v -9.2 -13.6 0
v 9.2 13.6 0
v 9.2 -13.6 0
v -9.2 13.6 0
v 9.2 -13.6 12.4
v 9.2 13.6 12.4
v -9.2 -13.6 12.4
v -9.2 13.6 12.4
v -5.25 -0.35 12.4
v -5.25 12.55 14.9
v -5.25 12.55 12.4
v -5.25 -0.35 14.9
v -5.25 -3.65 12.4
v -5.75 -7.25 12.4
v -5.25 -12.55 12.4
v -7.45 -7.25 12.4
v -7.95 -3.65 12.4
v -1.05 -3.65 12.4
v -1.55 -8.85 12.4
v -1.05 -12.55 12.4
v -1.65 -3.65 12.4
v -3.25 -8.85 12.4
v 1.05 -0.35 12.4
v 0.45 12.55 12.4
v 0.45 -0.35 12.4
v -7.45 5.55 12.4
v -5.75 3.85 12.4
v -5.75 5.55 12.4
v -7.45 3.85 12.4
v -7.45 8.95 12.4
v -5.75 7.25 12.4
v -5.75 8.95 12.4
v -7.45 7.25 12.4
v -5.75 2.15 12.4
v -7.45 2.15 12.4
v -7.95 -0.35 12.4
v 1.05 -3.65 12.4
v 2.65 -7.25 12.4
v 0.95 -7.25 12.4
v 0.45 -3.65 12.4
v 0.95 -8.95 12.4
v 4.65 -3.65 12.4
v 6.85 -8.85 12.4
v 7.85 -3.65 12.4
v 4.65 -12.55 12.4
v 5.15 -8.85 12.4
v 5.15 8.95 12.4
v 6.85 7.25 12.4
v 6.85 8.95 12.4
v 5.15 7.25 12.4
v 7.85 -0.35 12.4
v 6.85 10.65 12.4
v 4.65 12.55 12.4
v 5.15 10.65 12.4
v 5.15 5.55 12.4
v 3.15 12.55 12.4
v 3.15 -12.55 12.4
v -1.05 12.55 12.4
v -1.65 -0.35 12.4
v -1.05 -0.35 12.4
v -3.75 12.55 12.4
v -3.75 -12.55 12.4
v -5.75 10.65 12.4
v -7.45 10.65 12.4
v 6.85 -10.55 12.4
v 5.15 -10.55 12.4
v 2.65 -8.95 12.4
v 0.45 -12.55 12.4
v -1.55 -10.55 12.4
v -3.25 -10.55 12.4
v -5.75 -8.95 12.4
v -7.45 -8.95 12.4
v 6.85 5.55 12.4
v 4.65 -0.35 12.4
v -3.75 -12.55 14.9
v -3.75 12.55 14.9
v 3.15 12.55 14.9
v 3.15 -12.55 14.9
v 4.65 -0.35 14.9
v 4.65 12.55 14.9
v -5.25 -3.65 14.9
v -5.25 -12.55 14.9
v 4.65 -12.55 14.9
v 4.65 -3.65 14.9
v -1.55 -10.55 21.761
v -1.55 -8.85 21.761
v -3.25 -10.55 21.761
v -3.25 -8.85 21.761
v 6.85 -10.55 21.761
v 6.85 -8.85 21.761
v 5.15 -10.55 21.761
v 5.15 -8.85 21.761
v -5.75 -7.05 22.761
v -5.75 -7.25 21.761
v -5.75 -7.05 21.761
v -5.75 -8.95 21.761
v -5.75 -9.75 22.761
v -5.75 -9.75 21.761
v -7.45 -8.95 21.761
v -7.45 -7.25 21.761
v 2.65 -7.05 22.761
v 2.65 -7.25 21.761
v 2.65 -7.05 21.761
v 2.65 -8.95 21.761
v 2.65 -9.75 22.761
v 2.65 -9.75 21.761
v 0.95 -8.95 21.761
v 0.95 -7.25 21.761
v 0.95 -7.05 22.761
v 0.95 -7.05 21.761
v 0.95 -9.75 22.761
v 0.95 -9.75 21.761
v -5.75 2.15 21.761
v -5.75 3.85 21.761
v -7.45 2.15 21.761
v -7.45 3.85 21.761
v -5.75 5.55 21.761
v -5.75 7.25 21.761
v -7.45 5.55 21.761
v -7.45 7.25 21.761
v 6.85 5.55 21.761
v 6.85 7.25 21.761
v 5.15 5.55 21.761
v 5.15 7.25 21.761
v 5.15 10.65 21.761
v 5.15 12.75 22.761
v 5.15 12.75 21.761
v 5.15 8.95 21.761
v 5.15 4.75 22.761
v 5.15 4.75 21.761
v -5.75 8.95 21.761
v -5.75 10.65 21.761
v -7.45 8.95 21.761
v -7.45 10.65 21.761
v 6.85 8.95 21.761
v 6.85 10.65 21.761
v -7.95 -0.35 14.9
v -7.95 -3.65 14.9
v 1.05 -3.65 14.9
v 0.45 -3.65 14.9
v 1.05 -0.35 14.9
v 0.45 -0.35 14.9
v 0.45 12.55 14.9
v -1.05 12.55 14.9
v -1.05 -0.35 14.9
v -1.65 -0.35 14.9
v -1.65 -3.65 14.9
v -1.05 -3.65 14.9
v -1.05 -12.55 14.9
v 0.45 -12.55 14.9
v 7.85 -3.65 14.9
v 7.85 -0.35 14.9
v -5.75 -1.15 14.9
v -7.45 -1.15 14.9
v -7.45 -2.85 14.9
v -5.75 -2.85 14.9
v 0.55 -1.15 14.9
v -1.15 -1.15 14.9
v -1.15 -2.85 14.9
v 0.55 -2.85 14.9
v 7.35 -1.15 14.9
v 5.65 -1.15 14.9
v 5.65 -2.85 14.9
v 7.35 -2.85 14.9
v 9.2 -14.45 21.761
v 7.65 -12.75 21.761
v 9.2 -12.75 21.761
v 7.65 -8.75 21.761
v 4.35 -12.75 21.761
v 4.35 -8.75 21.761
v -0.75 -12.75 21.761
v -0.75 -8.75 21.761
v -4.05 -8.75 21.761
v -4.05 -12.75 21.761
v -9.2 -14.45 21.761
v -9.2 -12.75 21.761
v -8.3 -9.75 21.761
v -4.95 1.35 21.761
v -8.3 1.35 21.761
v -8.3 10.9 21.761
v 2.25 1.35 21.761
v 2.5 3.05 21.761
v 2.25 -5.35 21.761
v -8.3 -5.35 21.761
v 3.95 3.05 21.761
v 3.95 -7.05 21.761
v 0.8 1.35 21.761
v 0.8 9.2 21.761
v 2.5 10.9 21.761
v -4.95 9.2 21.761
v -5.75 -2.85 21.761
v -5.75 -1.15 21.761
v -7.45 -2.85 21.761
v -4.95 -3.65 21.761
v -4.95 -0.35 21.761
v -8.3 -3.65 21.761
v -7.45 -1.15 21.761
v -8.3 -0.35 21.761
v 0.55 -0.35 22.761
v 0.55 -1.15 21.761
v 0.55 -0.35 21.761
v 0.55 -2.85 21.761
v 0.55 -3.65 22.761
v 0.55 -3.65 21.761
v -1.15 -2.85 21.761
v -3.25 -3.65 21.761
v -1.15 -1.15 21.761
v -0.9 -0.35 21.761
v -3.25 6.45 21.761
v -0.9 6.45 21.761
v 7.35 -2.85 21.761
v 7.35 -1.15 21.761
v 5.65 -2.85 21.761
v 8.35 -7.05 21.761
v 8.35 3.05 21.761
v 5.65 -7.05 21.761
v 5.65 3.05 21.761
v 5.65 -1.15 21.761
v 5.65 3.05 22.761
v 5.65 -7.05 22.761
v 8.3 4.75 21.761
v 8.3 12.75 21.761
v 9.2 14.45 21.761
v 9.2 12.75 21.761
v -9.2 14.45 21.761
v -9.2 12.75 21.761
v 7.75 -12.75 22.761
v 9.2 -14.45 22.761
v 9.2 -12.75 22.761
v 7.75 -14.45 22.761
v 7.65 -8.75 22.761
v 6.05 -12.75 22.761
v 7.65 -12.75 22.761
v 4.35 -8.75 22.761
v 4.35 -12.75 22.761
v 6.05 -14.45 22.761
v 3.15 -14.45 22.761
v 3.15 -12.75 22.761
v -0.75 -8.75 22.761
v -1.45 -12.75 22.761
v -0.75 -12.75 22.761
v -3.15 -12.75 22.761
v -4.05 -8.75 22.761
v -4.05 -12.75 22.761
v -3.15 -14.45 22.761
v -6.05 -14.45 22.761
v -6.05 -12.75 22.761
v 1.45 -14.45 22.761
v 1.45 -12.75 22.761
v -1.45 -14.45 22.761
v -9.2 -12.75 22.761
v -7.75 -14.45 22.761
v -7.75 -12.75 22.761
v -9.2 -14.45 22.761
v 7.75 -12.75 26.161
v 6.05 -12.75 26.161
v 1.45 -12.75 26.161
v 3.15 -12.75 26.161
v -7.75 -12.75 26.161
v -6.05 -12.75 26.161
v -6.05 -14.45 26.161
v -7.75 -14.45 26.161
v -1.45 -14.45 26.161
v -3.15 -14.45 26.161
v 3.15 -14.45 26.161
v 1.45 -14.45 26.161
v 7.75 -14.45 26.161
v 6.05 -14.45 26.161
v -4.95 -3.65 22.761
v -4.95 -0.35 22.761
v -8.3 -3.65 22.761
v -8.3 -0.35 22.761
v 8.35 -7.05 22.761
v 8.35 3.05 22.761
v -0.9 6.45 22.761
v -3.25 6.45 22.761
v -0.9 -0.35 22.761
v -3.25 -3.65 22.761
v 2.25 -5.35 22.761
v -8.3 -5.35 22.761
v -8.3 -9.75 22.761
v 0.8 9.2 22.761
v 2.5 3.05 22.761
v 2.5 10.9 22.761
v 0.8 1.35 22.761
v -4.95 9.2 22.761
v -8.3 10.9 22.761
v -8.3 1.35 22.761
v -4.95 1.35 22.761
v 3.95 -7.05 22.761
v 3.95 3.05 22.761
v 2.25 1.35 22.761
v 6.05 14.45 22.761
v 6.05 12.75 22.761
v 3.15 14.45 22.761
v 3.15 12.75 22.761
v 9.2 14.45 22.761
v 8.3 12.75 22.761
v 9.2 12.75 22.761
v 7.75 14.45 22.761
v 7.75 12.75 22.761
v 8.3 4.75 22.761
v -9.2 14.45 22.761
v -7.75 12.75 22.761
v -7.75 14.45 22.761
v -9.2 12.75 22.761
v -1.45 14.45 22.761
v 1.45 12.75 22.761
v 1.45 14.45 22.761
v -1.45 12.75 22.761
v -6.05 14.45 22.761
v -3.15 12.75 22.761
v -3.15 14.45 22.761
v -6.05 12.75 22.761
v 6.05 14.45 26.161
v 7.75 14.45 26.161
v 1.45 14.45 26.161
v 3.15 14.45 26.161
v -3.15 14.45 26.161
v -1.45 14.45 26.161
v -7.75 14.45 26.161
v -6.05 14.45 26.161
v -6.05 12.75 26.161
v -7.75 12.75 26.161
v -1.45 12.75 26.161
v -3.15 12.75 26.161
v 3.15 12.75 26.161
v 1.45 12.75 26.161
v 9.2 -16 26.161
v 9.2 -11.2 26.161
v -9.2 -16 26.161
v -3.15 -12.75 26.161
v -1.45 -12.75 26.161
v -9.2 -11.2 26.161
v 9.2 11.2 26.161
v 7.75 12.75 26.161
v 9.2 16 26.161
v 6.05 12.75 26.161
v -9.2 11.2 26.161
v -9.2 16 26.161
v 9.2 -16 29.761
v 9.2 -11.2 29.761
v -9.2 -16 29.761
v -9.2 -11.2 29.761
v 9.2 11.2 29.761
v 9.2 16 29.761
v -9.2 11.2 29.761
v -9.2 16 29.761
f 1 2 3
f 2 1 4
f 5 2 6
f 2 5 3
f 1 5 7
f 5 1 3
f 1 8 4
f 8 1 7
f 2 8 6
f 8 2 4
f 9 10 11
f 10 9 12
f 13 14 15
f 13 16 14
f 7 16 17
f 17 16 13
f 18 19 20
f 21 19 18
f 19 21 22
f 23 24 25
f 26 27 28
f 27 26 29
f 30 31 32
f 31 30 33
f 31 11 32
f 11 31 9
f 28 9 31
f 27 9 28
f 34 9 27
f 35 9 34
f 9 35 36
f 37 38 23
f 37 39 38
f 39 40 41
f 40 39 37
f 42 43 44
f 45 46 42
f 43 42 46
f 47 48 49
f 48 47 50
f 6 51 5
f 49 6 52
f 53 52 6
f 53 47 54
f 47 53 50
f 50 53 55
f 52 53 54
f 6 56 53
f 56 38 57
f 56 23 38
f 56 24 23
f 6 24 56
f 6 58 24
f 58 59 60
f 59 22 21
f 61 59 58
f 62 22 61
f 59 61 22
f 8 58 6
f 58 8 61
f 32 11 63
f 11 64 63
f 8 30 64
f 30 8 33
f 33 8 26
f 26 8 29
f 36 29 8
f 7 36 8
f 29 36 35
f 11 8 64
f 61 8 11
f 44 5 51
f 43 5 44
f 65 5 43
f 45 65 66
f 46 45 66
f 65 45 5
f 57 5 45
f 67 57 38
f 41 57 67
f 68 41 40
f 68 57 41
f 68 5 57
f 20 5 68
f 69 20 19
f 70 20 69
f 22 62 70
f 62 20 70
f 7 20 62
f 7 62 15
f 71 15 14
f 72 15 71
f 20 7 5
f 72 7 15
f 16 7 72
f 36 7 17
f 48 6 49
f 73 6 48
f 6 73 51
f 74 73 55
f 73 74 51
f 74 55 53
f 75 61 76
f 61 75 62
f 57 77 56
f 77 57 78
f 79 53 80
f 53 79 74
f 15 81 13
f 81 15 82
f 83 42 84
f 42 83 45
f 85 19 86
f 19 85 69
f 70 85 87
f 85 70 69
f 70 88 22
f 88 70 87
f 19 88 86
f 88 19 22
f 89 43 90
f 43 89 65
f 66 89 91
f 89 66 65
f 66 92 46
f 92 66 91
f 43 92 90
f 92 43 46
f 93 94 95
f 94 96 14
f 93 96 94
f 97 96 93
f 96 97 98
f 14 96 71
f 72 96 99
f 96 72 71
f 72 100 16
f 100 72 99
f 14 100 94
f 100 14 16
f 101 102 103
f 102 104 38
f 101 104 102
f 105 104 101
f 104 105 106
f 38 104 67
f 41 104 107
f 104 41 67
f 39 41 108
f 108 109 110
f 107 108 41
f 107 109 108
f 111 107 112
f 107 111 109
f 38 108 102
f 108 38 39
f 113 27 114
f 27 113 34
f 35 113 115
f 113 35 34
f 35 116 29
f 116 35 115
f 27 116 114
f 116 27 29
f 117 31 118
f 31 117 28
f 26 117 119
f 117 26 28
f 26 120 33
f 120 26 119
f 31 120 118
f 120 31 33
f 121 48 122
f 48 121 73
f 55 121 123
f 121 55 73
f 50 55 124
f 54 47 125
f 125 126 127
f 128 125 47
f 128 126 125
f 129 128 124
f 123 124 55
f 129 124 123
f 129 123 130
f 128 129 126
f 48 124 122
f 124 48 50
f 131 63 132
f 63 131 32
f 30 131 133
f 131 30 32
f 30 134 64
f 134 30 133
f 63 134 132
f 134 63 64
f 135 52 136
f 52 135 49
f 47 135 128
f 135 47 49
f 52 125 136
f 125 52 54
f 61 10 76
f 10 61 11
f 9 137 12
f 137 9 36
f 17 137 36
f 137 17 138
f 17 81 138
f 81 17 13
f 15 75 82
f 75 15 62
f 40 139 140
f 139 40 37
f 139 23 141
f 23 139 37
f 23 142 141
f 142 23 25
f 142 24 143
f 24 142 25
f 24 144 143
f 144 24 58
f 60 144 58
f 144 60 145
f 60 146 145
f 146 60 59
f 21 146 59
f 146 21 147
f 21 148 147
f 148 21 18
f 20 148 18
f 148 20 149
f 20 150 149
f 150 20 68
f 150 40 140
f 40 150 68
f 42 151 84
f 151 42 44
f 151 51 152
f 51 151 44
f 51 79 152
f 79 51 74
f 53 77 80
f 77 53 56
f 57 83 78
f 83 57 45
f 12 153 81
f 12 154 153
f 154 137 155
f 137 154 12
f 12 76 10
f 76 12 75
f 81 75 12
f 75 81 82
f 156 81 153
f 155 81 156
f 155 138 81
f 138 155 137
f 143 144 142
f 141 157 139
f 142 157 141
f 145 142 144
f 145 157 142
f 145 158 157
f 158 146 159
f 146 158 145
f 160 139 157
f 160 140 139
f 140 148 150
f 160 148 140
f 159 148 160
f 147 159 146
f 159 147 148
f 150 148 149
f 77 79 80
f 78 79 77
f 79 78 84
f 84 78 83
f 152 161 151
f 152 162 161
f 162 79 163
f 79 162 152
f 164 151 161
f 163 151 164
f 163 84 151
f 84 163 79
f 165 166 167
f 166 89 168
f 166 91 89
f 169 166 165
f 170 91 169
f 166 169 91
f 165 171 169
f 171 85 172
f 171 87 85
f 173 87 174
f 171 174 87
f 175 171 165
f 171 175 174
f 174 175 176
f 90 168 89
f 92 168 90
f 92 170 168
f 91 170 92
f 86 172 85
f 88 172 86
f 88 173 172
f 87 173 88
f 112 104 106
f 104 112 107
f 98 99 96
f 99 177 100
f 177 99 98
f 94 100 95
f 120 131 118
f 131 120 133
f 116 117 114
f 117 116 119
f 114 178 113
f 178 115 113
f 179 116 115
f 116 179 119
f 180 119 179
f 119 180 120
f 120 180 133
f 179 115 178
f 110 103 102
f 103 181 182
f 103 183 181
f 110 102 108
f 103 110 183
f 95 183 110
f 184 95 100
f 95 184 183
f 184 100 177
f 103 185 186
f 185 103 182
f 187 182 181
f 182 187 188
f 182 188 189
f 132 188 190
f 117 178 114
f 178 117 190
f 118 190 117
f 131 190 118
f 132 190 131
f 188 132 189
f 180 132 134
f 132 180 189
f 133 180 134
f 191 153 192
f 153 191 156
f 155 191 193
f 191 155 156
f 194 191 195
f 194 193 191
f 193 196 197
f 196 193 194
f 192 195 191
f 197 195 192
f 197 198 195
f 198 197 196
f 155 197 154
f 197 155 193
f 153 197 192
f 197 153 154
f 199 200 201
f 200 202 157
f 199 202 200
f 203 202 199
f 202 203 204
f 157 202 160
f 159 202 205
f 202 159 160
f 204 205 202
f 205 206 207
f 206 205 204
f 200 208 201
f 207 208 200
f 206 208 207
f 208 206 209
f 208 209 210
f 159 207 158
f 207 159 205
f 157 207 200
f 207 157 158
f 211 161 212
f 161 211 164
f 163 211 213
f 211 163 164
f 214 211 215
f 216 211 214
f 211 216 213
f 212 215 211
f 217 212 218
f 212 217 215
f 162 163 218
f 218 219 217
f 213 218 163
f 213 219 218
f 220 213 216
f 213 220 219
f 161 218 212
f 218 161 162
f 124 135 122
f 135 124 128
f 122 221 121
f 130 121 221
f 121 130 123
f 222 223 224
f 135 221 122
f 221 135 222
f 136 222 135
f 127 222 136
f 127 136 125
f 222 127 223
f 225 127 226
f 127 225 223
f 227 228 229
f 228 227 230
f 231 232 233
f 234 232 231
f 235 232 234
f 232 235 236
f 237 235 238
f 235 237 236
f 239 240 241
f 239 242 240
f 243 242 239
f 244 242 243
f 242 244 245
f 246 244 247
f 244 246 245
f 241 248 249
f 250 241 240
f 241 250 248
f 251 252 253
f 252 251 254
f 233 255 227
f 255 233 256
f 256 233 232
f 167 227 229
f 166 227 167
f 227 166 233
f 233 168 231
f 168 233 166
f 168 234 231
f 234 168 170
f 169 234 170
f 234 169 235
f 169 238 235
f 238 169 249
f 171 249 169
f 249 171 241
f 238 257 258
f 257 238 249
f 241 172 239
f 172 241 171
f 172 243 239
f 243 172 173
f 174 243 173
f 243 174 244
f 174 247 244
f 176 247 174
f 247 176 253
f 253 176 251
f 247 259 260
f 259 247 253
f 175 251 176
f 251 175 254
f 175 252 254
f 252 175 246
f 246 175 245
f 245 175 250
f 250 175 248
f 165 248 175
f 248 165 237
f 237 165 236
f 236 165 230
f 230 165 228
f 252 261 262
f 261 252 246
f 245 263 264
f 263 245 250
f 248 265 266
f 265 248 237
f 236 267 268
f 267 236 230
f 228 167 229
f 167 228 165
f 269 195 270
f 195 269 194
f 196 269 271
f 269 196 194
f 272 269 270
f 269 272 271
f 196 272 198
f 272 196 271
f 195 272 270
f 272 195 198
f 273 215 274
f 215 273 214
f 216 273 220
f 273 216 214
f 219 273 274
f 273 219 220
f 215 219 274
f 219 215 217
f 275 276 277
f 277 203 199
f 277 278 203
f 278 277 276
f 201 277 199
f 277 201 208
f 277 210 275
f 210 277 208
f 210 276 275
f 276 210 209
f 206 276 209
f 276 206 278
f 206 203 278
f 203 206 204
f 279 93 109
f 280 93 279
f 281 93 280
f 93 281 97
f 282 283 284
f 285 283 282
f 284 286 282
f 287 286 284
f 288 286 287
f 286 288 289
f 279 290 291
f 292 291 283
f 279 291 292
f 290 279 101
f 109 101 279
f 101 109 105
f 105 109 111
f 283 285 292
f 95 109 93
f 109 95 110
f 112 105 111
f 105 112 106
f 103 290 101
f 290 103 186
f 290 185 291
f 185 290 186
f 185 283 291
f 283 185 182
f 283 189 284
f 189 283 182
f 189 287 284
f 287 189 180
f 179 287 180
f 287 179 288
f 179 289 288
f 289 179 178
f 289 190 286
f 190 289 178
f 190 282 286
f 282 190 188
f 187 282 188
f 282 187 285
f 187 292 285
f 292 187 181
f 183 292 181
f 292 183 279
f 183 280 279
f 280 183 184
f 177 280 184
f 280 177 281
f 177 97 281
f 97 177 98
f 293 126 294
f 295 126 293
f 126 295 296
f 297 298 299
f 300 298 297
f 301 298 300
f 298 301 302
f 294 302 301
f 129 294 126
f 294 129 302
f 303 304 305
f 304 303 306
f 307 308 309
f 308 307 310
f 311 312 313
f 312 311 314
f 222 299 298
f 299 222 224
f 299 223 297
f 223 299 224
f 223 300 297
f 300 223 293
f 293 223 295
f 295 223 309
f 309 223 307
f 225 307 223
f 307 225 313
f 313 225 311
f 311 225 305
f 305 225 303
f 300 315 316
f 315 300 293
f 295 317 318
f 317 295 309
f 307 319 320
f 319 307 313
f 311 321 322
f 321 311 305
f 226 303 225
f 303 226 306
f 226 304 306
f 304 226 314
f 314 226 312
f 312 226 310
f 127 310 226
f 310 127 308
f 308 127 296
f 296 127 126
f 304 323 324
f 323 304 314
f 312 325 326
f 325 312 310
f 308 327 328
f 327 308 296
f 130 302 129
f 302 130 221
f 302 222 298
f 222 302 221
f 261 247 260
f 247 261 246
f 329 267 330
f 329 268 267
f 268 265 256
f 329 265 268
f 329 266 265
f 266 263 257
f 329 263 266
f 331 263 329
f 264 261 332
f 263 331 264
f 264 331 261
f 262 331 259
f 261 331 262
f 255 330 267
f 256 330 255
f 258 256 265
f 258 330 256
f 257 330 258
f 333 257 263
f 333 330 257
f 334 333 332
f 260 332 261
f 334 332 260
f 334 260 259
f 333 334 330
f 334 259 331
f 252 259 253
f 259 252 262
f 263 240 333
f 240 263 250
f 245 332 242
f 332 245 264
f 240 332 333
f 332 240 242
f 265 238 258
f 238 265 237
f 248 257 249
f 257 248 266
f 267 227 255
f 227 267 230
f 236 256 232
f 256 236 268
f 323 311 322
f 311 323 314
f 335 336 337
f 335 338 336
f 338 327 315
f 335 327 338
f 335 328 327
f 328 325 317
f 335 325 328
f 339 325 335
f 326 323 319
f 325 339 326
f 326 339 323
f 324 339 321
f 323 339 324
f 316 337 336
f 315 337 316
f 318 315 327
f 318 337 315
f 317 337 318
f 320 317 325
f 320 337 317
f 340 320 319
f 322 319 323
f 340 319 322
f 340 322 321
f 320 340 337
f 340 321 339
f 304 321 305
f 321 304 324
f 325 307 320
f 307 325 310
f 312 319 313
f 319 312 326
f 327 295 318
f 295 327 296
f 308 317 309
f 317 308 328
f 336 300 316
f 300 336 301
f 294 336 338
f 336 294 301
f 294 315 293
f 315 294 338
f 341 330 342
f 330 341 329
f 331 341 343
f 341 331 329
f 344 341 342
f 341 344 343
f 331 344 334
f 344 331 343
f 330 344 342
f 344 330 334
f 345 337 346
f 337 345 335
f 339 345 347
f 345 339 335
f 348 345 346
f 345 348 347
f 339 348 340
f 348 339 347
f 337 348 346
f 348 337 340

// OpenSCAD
// Generated by SolidPython 0.4.2 on 2020-09-29 23:21:34
//!OpenSCAD

scale(v = 0.0100000000) {
	translate(v = [-920, -1360, 0]) {
		union() {
			color(c = [0.4000000000, 0.4000000000, 0.4000000000]) {
				translate(v = [0, 0, 0]) {
					linear_extrude(height = 1000.0000000000) {
						polygon(paths = [[0, 1, 2, 3]], points = [[0, 0], [0, 2720], [1840, 2720], [1840, 0]]);
					}
				}
			}
			color(c = [0.2000000000, 0.6000000000, 0.2000000000]) {
				translate(v = [0, 0, 1000.0000000000]) {
					linear_extrude(height = 120.0000000000) {
						polygon(paths = [[0, 1, 2, 3]], points = [[0, 1305], [0, 2720], [1840, 2720], [1840, 1305]]);
					}
				}
			}
			color(c = [0.4000000000, 0.4000000000, 0.4000000000]) {
				translate(v = [0, 0, 1000.0000000000]) {
					linear_extrude(height = 120.0000000000) {
						polygon(paths = [[0, 1, 2, 3]], points = [[0, 0], [0, 1305], [1840, 1305], [1840, 0]]);
					}
				}
			}
			color(c = [0.9000000000, 0.6000000000, 0.6000000000]) {
				translate(v = [0, 0, 1120.0000000000]) {
					linear_extrude(height = 120.0000000000) {
						polygon(paths = [[0, 1, 2, 3]], points = [[135, 1485], [135, 2485], [395, 2485], [395, 1485]]);
					}
				}
			}
			color(c = [0.9000000000, 0.6000000000, 0.6000000000]) {
				translate(v = [0, 0, 1120.0000000000]) {
					linear_extrude(height = 120.0000000000) {
						polygon(paths = [[0, 1, 2, 3]], points = [[545, 1485], [545, 2485], [815, 2485], [815, 1485]]);
					}
				}
			}
			color(c = [0.9000000000, 0.6000000000, 0.6000000000]) {
				translate(v = [0, 0, 1120.0000000000]) {
					linear_extrude(height = 120.0000000000) {
						polygon(paths = [[0, 1, 2, 3]], points = [[965, 1485], [965, 2485], [1235, 2485], [1235, 1485]]);
					}
				}
			}
			color(c = [0.9000000000, 0.6000000000, 0.6000000000]) {
				translate(v = [0, 0, 1120.0000000000]) {
					linear_extrude(height = 120.0000000000) {
						polygon(paths = [[0, 1, 2, 3]], points = [[1385, 1485], [1385, 2485], [1645, 2485], [1645, 1485]]);
					}
				}
			}
			color(c = [0.9000000000, 0.6000000000, 0.9000000000]) {
				translate(v = [0, 0, 1120.0000000000]) {
					linear_extrude(height = 120.0000000000) {
						polygon(paths = [[0, 1, 2, 3]], points = [[135, 235], [135, 885], [395, 885], [395, 235]]);
					}
				}
			}
			color(c = [0.9000000000, 0.6000000000, 0.9000000000]) {
				translate(v = [0, 0, 1120.0000000000]) {
					linear_extrude(height = 120.0000000000) {
						polygon(paths = [[0, 1, 2, 3]], points = [[545, 235], [545, 885], [815, 885], [815, 235]]);
					}
				}
			}
			color(c = [0.9000000000, 0.6000000000, 0.9000000000]) {
				translate(v = [0, 0, 1120.0000000000]) {
					linear_extrude(height = 120.0000000000) {
						polygon(paths = [[0, 1, 2, 3]], points = [[965, 235], [965, 885], [1235, 885], [1235, 235]]);
					}
				}
			}
			color(c = [0.9000000000, 0.6000000000, 0.9000000000]) {
				translate(v = [0, 0, 1120.0000000000]) {
					linear_extrude(height = 120.0000000000) {
						polygon(paths = [[0, 1, 2, 3]], points = [[1385, 235], [1385, 885], [1645, 885], [1645, 235]]);
					}
				}
			}
			color(c = [0.2000000000, 0.6000000000, 0.2000000000]) {
				translate(v = [0, 0, 1120.0000000000]) {
					linear_extrude(height = 120.0000000000) {
						difference() {
							polygon(paths = [[0, 1, 2, 3]], points = [[0, 1305], [0, 2720], [1840, 2720], [1840, 1305]]);
							polygon(paths = [[0, 1, 2, 3]], points = [[135, 1485], [395, 1485], [395, 2485], [135, 2485]]);
							polygon(paths = [[0, 1, 2, 3]], points = [[545, 1485], [815, 1485], [815, 2485], [545, 2485]]);
							polygon(paths = [[0, 1, 2, 3]], points = [[965, 1485], [1235, 1485], [1235, 2485], [965, 2485]]);
							polygon(paths = [[0, 1, 2, 3]], points = [[1385, 1485], [1645, 1485], [1645, 2485], [1385, 2485]]);
						}
					}
				}
			}
			color(c = [0.4000000000, 0.4000000000, 0.4000000000]) {
				translate(v = [0, 0, 1120.0000000000]) {
					linear_extrude(height = 120.0000000000) {
						difference() {
							polygon(paths = [[0, 1, 2, 3]], points = [[0, 0], [0, 1305], [1840, 1305], [1840, 0]]);
							polygon(paths = [[0, 1, 2, 3]], points = [[135, 235], [395, 235], [395, 885], [135, 885]]);
							polygon(paths = [[0, 1, 2, 3]], points = [[545, 235], [815, 235], [815, 885], [545, 885]]);
							polygon(paths = [[0, 1, 2, 3]], points = [[965, 235], [1235, 235], [1235, 885], [965, 885]]);
							polygon(paths = [[0, 1, 2, 3]], points = [[1385, 235], [1645, 235], [1645, 885], [1385, 885]]);
						}
					}
				}
			}
			color(c = [0.1000000000, 0.1000000000, 0.1000000000]) {
				translate(v = [0, 0, 1240.0000000000]) {
					linear_extrude(height = 70.0000000000) {
						polygon(paths = [[0, 1, 2, 3]], points = [[595, 305], [595, 475], [765, 475], [765, 305]]);
					}
				}
			}
			color(c = [0.1000000000, 0.1000000000, 0.1000000000]) {
				translate(v = [0, 0, 1240.0000000000]) {
					linear_extrude(height = 70.0000000000) {
						polygon(paths = [[0, 1, 2, 3]], points = [[1435, 305], [1435, 475], [1605, 475], [1605, 305]]);
					}
				}
			}
			color(c = [0.1000000000, 0.1000000000, 0.1000000000]) {
				translate(v = [0, 0, 1240.0000000000]) {
					linear_extrude(height = 70.0000000000) {
						polygon(paths = [[0, 1, 2, 3]], points = [[175, 465], [175, 635], [345, 635], [345, 465]]);
					}
				}
			}
			color(c = [0.1000000000, 0.1000000000, 0.1000000000]) {
				translate(v = [0, 0, 1240.0000000000]) {
					linear_extrude(height = 70.0000000000) {
						polygon(paths = [[0, 1, 2, 3]], points = [[1015, 465], [1015, 635], [1185, 635], [1185, 465]]);
					}
				}
			}
			color(c = [0.1000000000, 0.1000000000, 0.1000000000]) {
				translate(v = [0, 0, 1240.0000000000]) {
					linear_extrude(height = 70.0000000000) {
						polygon(paths = [[0, 1, 2, 3]], points = [[175, 1575], [175, 1745], [345, 1745], [345, 1575]]);
					}
				}
			}
			color(c = [0.1000000000, 0.1000000000, 0.1000000000]) {
				translate(v = [0, 0, 1240.0000000000]) {
					linear_extrude(height = 70.0000000000) {
						polygon(paths = [[0, 1, 2, 3]], points = [[175, 1915], [175, 2085], [345, 2085], [345, 1915]]);
					}
				}
			}
			color(c = [0.1000000000, 0.1000000000, 0.1000000000]) {
				translate(v = [0, 0, 1240.0000000000]) {
					linear_extrude(height = 70.0000000000) {
						polygon(paths = [[0, 1, 2, 3]], points = [[1435, 1915], [1435, 2085], [1605, 2085], [1605, 1915]]);
					}
				}
			}
			color(c = [0.1000000000, 0.1000000000, 0.1000000000]) {
				translate(v = [0, 0, 1240.0000000000]) {
					linear_extrude(height = 70.0000000000) {
						polygon(paths = [[0, 1, 2, 3]], points = [[175, 2255], [175, 2425], [345, 2425], [345, 2255]]);
					}
				}
			}
			color(c = [0.1000000000, 0.1000000000, 0.1000000000]) {
				translate(v = [0, 0, 1240.0000000000]) {
					linear_extrude(height = 70.0000000000) {
						polygon(paths = [[0, 1, 2, 3]], points = [[1435, 2255], [1435, 2425], [1605, 2425], [1605, 2255]]);
					}
				}
			}
			color(c = [1.0000000000, 1.0000000000, 1.0000000000]) {
				translate(v = [0, 0, 1240.0000000000]) {
					linear_extrude(height = 70.0000000000) {
						polygon(paths = [[0, 1, 2, 3, 4, 5, 6, 7]], points = [[395, 105], [395, 995], [125, 995], [125, 1325], [395, 1325], [395, 2615], [545, 2615], [545, 105]]);
					}
				}
			}
			color(c = [1.0000000000, 1.0000000000, 1.0000000000]) {
				translate(v = [0, 0, 1240.0000000000]) {
					linear_extrude(height = 70.0000000000) {
						polygon(paths = [[0, 1, 2, 3, 4, 5, 6, 7, 8, 9, 10, 11]], points = [[815, 105], [815, 995], [755, 995], [755, 1325], [815, 1325], [815, 2615], [965, 2615], [965, 1325], [1025, 1325], [1025, 995], [965, 995], [965, 105]]);
					}
				}
			}
			color(c = [1.0000000000, 1.0000000000, 1.0000000000]) {
				translate(v = [0, 0, 1240.0000000000]) {
					linear_extrude(height = 70.0000000000) {
						polygon(paths = [[0, 1, 2, 3, 4, 5, 6, 7]], points = [[1235, 105], [1235, 2615], [1385, 2615], [1385, 1325], [1705, 1325], [1705, 995], [1385, 995], [1385, 105]]);
					}
				}
			}
			color(c = [0.1000000000, 0.1000000000, 0.1000000000]) {
				translate(v = [0, 0, 1310.0000000000]) {
					linear_extrude(height = 180.0000000000) {
						polygon(paths = [[0, 1, 2, 3]], points = [[595, 305], [595, 475], [765, 475], [765, 305]]);
					}
				}
			}
			color(c = [0.1000000000, 0.1000000000, 0.1000000000]) {
				translate(v = [0, 0, 1310.0000000000]) {
					linear_extrude(height = 180.0000000000) {
						polygon(paths = [[0, 1, 2, 3]], points = [[1435, 305], [1435, 475], [1605, 475], [1605, 305]]);
					}
				}
			}
			color(c = [0.1000000000, 0.1000000000, 0.1000000000]) {
				translate(v = [0, 0, 1310.0000000000]) {
					linear_extrude(height = 180.0000000000) {
						polygon(paths = [[0, 1, 2, 3]], points = [[175, 465], [175, 635], [345, 635], [345, 465]]);
					}
				}
			}
			color(c = [0.1000000000, 0.1000000000, 0.1000000000]) {
				translate(v = [0, 0, 1310.0000000000]) {
					linear_extrude(height = 180.0000000000) {
						polygon(paths = [[0, 1, 2, 3]], points = [[1015, 465], [1015, 635], [1185, 635], [1185, 465]]);
					}
				}
			}
			color(c = [0.1000000000, 0.1000000000, 0.1000000000]) {
				translate(v = [0, 0, 1310.0000000000]) {
					linear_extrude(height = 180.0000000000) {
						polygon(paths = [[0, 1, 2, 3]], points = [[175, 1575], [175, 1745], [345, 1745], [345, 1575]]);
					}
				}
			}
			color(c = [0.1000000000, 0.1000000000, 0.1000000000]) {
				translate(v = [0, 0, 1310.0000000000]) {
					linear_extrude(height = 180.0000000000) {
						polygon(paths = [[0, 1, 2, 3]], points = [[175, 1915], [175, 2085], [345, 2085], [345, 1915]]);
					}
				}
			}
			color(c = [0.1000000000, 0.1000000000, 0.1000000000]) {
				translate(v = [0, 0, 1310.0000000000]) {
					linear_extrude(height = 180.0000000000) {
						polygon(paths = [[0, 1, 2, 3]], points = [[1435, 1915], [1435, 2085], [1605, 2085], [1605, 1915]]);
					}
				}
			}
			color(c = [0.1000000000, 0.1000000000, 0.1000000000]) {
				translate(v = [0, 0, 1310.0000000000]) {
					linear_extrude(height = 180.0000000000) {
						polygon(paths = [[0, 1, 2, 3]], points = [[175, 2255], [175, 2425], [345, 2425], [345, 2255]]);
					}
				}
			}
			color(c = [0.1000000000, 0.1000000000, 0.1000000000]) {
				translate(v = [0, 0, 1310.0000000000]) {
					linear_extrude(height = 180.0000000000) {
						polygon(paths = [[0, 1, 2, 3]], points = [[1435, 2255], [1435, 2425], [1605, 2425], [1605, 2255]]);
					}
				}
			}
			color(c = [0.7000000000, 0, 0]) {
				translate(v = [0, 0, 1310.0000000000]) {
					linear_extrude(height = 180.0000000000) {
						polygon(paths = [[0, 1, 2, 3, 4, 5, 6, 7]], points = [[395, 105], [395, 995], [125, 995], [125, 1325], [395, 1325], [395, 2615], [545, 2615], [545, 105]]);
					}
				}
			}
			color(c = [0.7000000000, 0, 0]) {
				translate(v = [0, 0, 1310.0000000000]) {
					linear_extrude(height = 180.0000000000) {
						polygon(paths = [[0, 1, 2, 3, 4, 5, 6, 7, 8, 9, 10, 11]], points = [[815, 105], [815, 995], [755, 995], [755, 1325], [815, 1325], [815, 2615], [965, 2615], [965, 1325], [1025, 1325], [1025, 995], [965, 995], [965, 105]]);
					}
				}
			}
			color(c = [0.7000000000, 0, 0]) {
				translate(v = [0, 0, 1310.0000000000]) {
					linear_extrude(height = 180.0000000000) {
						polygon(paths = [[0, 1, 2, 3, 4, 5, 6, 7]], points = [[1235, 105], [1235, 2615], [1385, 2615], [1385, 1325], [1705, 1325], [1705, 995], [1385, 995], [1385, 105]]);
					}
				}
			}
			color(c = [0.1000000000, 0.1000000000, 0.1000000000]) {
				translate(v = [0, 0, 1490.0000000000]) {
					linear_extrude(height = 686.1000000000) {
						polygon(paths = [[0, 1, 2, 3]], points = [[595, 305], [595, 475], [765, 475], [765, 305]]);
					}
				}
			}
			color(c = [0.1000000000, 0.1000000000, 0.1000000000]) {
				translate(v = [0, 0, 1490.0000000000]) {
					linear_extrude(height = 686.1000000000) {
						polygon(paths = [[0, 1, 2, 3]], points = [[1435, 305], [1435, 475], [1605, 475], [1605, 305]]);
					}
				}
			}
			color(c = [0.1000000000, 0.1000000000, 0.1000000000]) {
				translate(v = [0, 0, 1490.0000000000]) {
					linear_extrude(height = 686.1000000000) {
						polygon(paths = [[0, 1, 2, 3]], points = [[175, 465], [175, 635], [345, 635], [345, 465]]);
					}
				}
			}
			color(c = [0.1000000000, 0.1000000000, 0.1000000000]) {
				translate(v = [0, 0, 1490.0000000000]) {
					linear_extrude(height = 686.1000000000) {
						polygon(paths = [[0, 1, 2, 3]], points = [[1015, 465], [1015, 635], [1185, 635], [1185, 465]]);
					}
				}
			}
			color(c = [0.1000000000, 0.1000000000, 0.1000000000]) {
				translate(v = [0, 0, 1490.0000000000]) {
					linear_extrude(height = 686.1000000000) {
						polygon(paths = [[0, 1, 2, 3]], points = [[175, 1075], [175, 1245], [345, 1245], [345, 1075]]);
					}
				}
			}
			color(c = [0.1000000000, 0.1000000000, 0.1000000000]) {
				translate(v = [0, 0, 1490.0000000000]) {
					linear_extrude(height = 686.1000000000) {
						polygon(paths = [[0, 1, 2, 3]], points = [[805, 1075], [805, 1245], [975, 1245], [975, 1075]]);
					}
				}
			}
			color(c = [0.1000000000, 0.1000000000, 0.1000000000]) {
				translate(v = [0, 0, 1490.0000000000]) {
					linear_extrude(height = 686.1000000000) {
						polygon(paths = [[0, 1, 2, 3]], points = [[1485, 1075], [1485, 1245], [1655, 1245], [1655, 1075]]);
					}
				}
			}
			color(c = [0.1000000000, 0.1000000000, 0.1000000000]) {
				translate(v = [0, 0, 1490.0000000000]) {
					linear_extrude(height = 686.1000000000) {
						polygon(paths = [[0, 1, 2, 3]], points = [[175, 1575], [175, 1745], [345, 1745], [345, 1575]]);
					}
				}
			}
			color(c = [0.1000000000, 0.1000000000, 0.1000000000]) {
				translate(v = [0, 0, 1490.0000000000]) {
					linear_extrude(height = 686.1000000000) {
						polygon(paths = [[0, 1, 2, 3]], points = [[175, 1915], [175, 2085], [345, 2085], [345, 1915]]);
					}
				}
			}
			color(c = [0.1000000000, 0.1000000000, 0.1000000000]) {
				translate(v = [0, 0, 1490.0000000000]) {
					linear_extrude(height = 686.1000000000) {
						polygon(paths = [[0, 1, 2, 3]], points = [[1435, 1915], [1435, 2085], [1605, 2085], [1605, 1915]]);
					}
				}
			}
			color(c = [0.1000000000, 0.1000000000, 0.1000000000]) {
				translate(v = [0, 0, 1490.0000000000]) {
					linear_extrude(height = 686.1000000000) {
						polygon(paths = [[0, 1, 2, 3]], points = [[175, 2255], [175, 2425], [345, 2425], [345, 2255]]);
					}
				}
			}
			color(c = [0.1000000000, 0.1000000000, 0.1000000000]) {
				translate(v = [0, 0, 1490.0000000000]) {
					linear_extrude(height = 686.1000000000) {
						polygon(paths = [[0, 1, 2, 3]], points = [[1435, 2255], [1435, 2425], [1605, 2425], [1605, 2255]]);
					}
				}
			}
			color(c = [0.9000000000, 0.6000000000, 0.6000000000]) {
				translate(v = [0, 0, 2176.1000000000]) {
					linear_extrude(height = 100.0000000000) {
						polygon(paths = [[0, 1, 2, 3, 4, 5, 6, 7, 8, 9, 10, 11]], points = [[0, -85], [0, 85], [515, 85], [515, 485], [845, 485], [845, 85], [1355, 85], [1355, 485], [1685, 485], [1685, 85], [1840, 85], [1840, -85]]);
					}
				}
			}
			color(c = [0.9000000000, 0.6000000000, 0.6000000000]) {
				translate(v = [0, 0, 2176.1000000000]) {
					linear_extrude(height = 100.0000000000) {
						polygon(paths = [[0, 1, 2, 3]], points = [[90, 995], [90, 1325], [425, 1325], [425, 995]]);
					}
				}
			}
			color(c = [0.9000000000, 0.6000000000, 0.6000000000]) {
				translate(v = [0, 0, 2176.1000000000]) {
					linear_extrude(height = 100.0000000000) {
						polygon(paths = [[0, 1, 2, 3]], points = [[1485, 655], [1485, 1665], [1755, 1665], [1755, 655]]);
					}
				}
			}
			color(c = [0.9000000000, 0.6000000000, 0.6000000000]) {
				translate(v = [0, 0, 2176.1000000000]) {
					linear_extrude(height = 100.0000000000) {
						polygon(paths = [[0, 1, 2, 3, 4, 5]], points = [[595, 995], [595, 2005], [830, 2005], [830, 1325], [975, 1325], [975, 995]]);
					}
				}
			}
			color(c = [0.9000000000, 0.6000000000, 0.6000000000]) {
				translate(v = [0, 0, 2176.1000000000]) {
					linear_extrude(height = 100.0000000000) {
						polygon(paths = [[0, 1, 2, 3, 4, 5, 6, 7, 8, 9, 10, 11, 12, 13, 14, 15, 16, 17, 18, 19]], points = [[90, 385], [90, 825], [1145, 825], [1145, 1495], [1000, 1495], [1000, 2280], [425, 2280], [425, 1495], [90, 1495], [90, 2450], [1170, 2450], [1170, 1665], [1315, 1665], [1315, 655], [1185, 655], [1185, 385], [1015, 385], [1015, 655], [345, 655], [345, 385]]);
					}
				}
			}
			color(c = [0.9000000000, 0.6000000000, 0.6000000000]) {
				translate(v = [0, 0, 2176.1000000000]) {
					linear_extrude(height = 100.0000000000) {
						polygon(paths = [[0, 1, 2, 3, 4, 5, 6, 7]], points = [[1435, 1835], [1435, 2635], [0, 2635], [0, 2805], [1840, 2805], [1840, 2635], [1750, 2635], [1750, 1835]]);
					}
				}
			}
			color(c = [0.5000000000, 0.5000000000, 0.5000000000]) {
				translate(v = [0, 0, 2276.1000000000]) {
					linear_extrude(height = 340.0000000000) {
						polygon(paths = [[0, 1, 2, 3]], points = [[145, -85], [145, 85], [315, 85], [315, -85]]);
					}
				}
			}
			color(c = [0.5000000000, 0.5000000000, 0.5000000000]) {
				translate(v = [0, 0, 2276.1000000000]) {
					linear_extrude(height = 340.0000000000) {
						polygon(paths = [[0, 1, 2, 3]], points = [[605, -85], [605, 85], [775, 85], [775, -85]]);
					}
				}
			}
			color(c = [0.5000000000, 0.5000000000, 0.5000000000]) {
				translate(v = [0, 0, 2276.1000000000]) {
					linear_extrude(height = 340.0000000000) {
						polygon(paths = [[0, 1, 2, 3]], points = [[1065, -85], [1065, 85], [1235, 85], [1235, -85]]);
					}
				}
			}
			color(c = [0.5000000000, 0.5000000000, 0.5000000000]) {
				translate(v = [0, 0, 2276.1000000000]) {
					linear_extrude(height = 340.0000000000) {
						polygon(paths = [[0, 1, 2, 3]], points = [[1525, -85], [1525, 85], [1695, 85], [1695, -85]]);
					}
				}
			}
			color(c = [0.5000000000, 0.5000000000, 0.5000000000]) {
				translate(v = [0, 0, 2276.1000000000]) {
					linear_extrude(height = 340.0000000000) {
						polygon(paths = [[0, 1, 2, 3]], points = [[145, 2635], [145, 2805], [315, 2805], [315, 2635]]);
					}
				}
			}
			color(c = [0.5000000000, 0.5000000000, 0.5000000000]) {
				translate(v = [0, 0, 2276.1000000000]) {
					linear_extrude(height = 340.0000000000) {
						polygon(paths = [[0, 1, 2, 3]], points = [[605, 2635], [605, 2805], [775, 2805], [775, 2635]]);
					}
				}
			}
			color(c = [0.5000000000, 0.5000000000, 0.5000000000]) {
				translate(v = [0, 0, 2276.1000000000]) {
					linear_extrude(height = 340.0000000000) {
						polygon(paths = [[0, 1, 2, 3]], points = [[1065, 2635], [1065, 2805], [1235, 2805], [1235, 2635]]);
					}
				}
			}
			color(c = [0.5000000000, 0.5000000000, 0.5000000000]) {
				translate(v = [0, 0, 2276.1000000000]) {
					linear_extrude(height = 340.0000000000) {
						polygon(paths = [[0, 1, 2, 3]], points = [[1525, 2635], [1525, 2805], [1695, 2805], [1695, 2635]]);
					}
				}
			}
			color(c = [0.3000000000, 0.3000000000, 1]) {
				translate(v = [0, 0, 2616.1000000000]) {
					linear_extrude(height = 360.0000000000) {
						polygon(paths = [[0, 1, 2, 3]], points = [[0, -240], [0, 240], [1840, 240], [1840, -240]]);
					}
				}
			}
			color(c = [0.3000000000, 0.3000000000, 1]) {
				translate(v = [0, 0, 2616.1000000000]) {
					linear_extrude(height = 360.0000000000) {
						polygon(paths = [[0, 1, 2, 3]], points = [[0, 2480], [0, 2960], [1840, 2960], [1840, 2480]]);
					}
				}
			}
		}
	}
}
